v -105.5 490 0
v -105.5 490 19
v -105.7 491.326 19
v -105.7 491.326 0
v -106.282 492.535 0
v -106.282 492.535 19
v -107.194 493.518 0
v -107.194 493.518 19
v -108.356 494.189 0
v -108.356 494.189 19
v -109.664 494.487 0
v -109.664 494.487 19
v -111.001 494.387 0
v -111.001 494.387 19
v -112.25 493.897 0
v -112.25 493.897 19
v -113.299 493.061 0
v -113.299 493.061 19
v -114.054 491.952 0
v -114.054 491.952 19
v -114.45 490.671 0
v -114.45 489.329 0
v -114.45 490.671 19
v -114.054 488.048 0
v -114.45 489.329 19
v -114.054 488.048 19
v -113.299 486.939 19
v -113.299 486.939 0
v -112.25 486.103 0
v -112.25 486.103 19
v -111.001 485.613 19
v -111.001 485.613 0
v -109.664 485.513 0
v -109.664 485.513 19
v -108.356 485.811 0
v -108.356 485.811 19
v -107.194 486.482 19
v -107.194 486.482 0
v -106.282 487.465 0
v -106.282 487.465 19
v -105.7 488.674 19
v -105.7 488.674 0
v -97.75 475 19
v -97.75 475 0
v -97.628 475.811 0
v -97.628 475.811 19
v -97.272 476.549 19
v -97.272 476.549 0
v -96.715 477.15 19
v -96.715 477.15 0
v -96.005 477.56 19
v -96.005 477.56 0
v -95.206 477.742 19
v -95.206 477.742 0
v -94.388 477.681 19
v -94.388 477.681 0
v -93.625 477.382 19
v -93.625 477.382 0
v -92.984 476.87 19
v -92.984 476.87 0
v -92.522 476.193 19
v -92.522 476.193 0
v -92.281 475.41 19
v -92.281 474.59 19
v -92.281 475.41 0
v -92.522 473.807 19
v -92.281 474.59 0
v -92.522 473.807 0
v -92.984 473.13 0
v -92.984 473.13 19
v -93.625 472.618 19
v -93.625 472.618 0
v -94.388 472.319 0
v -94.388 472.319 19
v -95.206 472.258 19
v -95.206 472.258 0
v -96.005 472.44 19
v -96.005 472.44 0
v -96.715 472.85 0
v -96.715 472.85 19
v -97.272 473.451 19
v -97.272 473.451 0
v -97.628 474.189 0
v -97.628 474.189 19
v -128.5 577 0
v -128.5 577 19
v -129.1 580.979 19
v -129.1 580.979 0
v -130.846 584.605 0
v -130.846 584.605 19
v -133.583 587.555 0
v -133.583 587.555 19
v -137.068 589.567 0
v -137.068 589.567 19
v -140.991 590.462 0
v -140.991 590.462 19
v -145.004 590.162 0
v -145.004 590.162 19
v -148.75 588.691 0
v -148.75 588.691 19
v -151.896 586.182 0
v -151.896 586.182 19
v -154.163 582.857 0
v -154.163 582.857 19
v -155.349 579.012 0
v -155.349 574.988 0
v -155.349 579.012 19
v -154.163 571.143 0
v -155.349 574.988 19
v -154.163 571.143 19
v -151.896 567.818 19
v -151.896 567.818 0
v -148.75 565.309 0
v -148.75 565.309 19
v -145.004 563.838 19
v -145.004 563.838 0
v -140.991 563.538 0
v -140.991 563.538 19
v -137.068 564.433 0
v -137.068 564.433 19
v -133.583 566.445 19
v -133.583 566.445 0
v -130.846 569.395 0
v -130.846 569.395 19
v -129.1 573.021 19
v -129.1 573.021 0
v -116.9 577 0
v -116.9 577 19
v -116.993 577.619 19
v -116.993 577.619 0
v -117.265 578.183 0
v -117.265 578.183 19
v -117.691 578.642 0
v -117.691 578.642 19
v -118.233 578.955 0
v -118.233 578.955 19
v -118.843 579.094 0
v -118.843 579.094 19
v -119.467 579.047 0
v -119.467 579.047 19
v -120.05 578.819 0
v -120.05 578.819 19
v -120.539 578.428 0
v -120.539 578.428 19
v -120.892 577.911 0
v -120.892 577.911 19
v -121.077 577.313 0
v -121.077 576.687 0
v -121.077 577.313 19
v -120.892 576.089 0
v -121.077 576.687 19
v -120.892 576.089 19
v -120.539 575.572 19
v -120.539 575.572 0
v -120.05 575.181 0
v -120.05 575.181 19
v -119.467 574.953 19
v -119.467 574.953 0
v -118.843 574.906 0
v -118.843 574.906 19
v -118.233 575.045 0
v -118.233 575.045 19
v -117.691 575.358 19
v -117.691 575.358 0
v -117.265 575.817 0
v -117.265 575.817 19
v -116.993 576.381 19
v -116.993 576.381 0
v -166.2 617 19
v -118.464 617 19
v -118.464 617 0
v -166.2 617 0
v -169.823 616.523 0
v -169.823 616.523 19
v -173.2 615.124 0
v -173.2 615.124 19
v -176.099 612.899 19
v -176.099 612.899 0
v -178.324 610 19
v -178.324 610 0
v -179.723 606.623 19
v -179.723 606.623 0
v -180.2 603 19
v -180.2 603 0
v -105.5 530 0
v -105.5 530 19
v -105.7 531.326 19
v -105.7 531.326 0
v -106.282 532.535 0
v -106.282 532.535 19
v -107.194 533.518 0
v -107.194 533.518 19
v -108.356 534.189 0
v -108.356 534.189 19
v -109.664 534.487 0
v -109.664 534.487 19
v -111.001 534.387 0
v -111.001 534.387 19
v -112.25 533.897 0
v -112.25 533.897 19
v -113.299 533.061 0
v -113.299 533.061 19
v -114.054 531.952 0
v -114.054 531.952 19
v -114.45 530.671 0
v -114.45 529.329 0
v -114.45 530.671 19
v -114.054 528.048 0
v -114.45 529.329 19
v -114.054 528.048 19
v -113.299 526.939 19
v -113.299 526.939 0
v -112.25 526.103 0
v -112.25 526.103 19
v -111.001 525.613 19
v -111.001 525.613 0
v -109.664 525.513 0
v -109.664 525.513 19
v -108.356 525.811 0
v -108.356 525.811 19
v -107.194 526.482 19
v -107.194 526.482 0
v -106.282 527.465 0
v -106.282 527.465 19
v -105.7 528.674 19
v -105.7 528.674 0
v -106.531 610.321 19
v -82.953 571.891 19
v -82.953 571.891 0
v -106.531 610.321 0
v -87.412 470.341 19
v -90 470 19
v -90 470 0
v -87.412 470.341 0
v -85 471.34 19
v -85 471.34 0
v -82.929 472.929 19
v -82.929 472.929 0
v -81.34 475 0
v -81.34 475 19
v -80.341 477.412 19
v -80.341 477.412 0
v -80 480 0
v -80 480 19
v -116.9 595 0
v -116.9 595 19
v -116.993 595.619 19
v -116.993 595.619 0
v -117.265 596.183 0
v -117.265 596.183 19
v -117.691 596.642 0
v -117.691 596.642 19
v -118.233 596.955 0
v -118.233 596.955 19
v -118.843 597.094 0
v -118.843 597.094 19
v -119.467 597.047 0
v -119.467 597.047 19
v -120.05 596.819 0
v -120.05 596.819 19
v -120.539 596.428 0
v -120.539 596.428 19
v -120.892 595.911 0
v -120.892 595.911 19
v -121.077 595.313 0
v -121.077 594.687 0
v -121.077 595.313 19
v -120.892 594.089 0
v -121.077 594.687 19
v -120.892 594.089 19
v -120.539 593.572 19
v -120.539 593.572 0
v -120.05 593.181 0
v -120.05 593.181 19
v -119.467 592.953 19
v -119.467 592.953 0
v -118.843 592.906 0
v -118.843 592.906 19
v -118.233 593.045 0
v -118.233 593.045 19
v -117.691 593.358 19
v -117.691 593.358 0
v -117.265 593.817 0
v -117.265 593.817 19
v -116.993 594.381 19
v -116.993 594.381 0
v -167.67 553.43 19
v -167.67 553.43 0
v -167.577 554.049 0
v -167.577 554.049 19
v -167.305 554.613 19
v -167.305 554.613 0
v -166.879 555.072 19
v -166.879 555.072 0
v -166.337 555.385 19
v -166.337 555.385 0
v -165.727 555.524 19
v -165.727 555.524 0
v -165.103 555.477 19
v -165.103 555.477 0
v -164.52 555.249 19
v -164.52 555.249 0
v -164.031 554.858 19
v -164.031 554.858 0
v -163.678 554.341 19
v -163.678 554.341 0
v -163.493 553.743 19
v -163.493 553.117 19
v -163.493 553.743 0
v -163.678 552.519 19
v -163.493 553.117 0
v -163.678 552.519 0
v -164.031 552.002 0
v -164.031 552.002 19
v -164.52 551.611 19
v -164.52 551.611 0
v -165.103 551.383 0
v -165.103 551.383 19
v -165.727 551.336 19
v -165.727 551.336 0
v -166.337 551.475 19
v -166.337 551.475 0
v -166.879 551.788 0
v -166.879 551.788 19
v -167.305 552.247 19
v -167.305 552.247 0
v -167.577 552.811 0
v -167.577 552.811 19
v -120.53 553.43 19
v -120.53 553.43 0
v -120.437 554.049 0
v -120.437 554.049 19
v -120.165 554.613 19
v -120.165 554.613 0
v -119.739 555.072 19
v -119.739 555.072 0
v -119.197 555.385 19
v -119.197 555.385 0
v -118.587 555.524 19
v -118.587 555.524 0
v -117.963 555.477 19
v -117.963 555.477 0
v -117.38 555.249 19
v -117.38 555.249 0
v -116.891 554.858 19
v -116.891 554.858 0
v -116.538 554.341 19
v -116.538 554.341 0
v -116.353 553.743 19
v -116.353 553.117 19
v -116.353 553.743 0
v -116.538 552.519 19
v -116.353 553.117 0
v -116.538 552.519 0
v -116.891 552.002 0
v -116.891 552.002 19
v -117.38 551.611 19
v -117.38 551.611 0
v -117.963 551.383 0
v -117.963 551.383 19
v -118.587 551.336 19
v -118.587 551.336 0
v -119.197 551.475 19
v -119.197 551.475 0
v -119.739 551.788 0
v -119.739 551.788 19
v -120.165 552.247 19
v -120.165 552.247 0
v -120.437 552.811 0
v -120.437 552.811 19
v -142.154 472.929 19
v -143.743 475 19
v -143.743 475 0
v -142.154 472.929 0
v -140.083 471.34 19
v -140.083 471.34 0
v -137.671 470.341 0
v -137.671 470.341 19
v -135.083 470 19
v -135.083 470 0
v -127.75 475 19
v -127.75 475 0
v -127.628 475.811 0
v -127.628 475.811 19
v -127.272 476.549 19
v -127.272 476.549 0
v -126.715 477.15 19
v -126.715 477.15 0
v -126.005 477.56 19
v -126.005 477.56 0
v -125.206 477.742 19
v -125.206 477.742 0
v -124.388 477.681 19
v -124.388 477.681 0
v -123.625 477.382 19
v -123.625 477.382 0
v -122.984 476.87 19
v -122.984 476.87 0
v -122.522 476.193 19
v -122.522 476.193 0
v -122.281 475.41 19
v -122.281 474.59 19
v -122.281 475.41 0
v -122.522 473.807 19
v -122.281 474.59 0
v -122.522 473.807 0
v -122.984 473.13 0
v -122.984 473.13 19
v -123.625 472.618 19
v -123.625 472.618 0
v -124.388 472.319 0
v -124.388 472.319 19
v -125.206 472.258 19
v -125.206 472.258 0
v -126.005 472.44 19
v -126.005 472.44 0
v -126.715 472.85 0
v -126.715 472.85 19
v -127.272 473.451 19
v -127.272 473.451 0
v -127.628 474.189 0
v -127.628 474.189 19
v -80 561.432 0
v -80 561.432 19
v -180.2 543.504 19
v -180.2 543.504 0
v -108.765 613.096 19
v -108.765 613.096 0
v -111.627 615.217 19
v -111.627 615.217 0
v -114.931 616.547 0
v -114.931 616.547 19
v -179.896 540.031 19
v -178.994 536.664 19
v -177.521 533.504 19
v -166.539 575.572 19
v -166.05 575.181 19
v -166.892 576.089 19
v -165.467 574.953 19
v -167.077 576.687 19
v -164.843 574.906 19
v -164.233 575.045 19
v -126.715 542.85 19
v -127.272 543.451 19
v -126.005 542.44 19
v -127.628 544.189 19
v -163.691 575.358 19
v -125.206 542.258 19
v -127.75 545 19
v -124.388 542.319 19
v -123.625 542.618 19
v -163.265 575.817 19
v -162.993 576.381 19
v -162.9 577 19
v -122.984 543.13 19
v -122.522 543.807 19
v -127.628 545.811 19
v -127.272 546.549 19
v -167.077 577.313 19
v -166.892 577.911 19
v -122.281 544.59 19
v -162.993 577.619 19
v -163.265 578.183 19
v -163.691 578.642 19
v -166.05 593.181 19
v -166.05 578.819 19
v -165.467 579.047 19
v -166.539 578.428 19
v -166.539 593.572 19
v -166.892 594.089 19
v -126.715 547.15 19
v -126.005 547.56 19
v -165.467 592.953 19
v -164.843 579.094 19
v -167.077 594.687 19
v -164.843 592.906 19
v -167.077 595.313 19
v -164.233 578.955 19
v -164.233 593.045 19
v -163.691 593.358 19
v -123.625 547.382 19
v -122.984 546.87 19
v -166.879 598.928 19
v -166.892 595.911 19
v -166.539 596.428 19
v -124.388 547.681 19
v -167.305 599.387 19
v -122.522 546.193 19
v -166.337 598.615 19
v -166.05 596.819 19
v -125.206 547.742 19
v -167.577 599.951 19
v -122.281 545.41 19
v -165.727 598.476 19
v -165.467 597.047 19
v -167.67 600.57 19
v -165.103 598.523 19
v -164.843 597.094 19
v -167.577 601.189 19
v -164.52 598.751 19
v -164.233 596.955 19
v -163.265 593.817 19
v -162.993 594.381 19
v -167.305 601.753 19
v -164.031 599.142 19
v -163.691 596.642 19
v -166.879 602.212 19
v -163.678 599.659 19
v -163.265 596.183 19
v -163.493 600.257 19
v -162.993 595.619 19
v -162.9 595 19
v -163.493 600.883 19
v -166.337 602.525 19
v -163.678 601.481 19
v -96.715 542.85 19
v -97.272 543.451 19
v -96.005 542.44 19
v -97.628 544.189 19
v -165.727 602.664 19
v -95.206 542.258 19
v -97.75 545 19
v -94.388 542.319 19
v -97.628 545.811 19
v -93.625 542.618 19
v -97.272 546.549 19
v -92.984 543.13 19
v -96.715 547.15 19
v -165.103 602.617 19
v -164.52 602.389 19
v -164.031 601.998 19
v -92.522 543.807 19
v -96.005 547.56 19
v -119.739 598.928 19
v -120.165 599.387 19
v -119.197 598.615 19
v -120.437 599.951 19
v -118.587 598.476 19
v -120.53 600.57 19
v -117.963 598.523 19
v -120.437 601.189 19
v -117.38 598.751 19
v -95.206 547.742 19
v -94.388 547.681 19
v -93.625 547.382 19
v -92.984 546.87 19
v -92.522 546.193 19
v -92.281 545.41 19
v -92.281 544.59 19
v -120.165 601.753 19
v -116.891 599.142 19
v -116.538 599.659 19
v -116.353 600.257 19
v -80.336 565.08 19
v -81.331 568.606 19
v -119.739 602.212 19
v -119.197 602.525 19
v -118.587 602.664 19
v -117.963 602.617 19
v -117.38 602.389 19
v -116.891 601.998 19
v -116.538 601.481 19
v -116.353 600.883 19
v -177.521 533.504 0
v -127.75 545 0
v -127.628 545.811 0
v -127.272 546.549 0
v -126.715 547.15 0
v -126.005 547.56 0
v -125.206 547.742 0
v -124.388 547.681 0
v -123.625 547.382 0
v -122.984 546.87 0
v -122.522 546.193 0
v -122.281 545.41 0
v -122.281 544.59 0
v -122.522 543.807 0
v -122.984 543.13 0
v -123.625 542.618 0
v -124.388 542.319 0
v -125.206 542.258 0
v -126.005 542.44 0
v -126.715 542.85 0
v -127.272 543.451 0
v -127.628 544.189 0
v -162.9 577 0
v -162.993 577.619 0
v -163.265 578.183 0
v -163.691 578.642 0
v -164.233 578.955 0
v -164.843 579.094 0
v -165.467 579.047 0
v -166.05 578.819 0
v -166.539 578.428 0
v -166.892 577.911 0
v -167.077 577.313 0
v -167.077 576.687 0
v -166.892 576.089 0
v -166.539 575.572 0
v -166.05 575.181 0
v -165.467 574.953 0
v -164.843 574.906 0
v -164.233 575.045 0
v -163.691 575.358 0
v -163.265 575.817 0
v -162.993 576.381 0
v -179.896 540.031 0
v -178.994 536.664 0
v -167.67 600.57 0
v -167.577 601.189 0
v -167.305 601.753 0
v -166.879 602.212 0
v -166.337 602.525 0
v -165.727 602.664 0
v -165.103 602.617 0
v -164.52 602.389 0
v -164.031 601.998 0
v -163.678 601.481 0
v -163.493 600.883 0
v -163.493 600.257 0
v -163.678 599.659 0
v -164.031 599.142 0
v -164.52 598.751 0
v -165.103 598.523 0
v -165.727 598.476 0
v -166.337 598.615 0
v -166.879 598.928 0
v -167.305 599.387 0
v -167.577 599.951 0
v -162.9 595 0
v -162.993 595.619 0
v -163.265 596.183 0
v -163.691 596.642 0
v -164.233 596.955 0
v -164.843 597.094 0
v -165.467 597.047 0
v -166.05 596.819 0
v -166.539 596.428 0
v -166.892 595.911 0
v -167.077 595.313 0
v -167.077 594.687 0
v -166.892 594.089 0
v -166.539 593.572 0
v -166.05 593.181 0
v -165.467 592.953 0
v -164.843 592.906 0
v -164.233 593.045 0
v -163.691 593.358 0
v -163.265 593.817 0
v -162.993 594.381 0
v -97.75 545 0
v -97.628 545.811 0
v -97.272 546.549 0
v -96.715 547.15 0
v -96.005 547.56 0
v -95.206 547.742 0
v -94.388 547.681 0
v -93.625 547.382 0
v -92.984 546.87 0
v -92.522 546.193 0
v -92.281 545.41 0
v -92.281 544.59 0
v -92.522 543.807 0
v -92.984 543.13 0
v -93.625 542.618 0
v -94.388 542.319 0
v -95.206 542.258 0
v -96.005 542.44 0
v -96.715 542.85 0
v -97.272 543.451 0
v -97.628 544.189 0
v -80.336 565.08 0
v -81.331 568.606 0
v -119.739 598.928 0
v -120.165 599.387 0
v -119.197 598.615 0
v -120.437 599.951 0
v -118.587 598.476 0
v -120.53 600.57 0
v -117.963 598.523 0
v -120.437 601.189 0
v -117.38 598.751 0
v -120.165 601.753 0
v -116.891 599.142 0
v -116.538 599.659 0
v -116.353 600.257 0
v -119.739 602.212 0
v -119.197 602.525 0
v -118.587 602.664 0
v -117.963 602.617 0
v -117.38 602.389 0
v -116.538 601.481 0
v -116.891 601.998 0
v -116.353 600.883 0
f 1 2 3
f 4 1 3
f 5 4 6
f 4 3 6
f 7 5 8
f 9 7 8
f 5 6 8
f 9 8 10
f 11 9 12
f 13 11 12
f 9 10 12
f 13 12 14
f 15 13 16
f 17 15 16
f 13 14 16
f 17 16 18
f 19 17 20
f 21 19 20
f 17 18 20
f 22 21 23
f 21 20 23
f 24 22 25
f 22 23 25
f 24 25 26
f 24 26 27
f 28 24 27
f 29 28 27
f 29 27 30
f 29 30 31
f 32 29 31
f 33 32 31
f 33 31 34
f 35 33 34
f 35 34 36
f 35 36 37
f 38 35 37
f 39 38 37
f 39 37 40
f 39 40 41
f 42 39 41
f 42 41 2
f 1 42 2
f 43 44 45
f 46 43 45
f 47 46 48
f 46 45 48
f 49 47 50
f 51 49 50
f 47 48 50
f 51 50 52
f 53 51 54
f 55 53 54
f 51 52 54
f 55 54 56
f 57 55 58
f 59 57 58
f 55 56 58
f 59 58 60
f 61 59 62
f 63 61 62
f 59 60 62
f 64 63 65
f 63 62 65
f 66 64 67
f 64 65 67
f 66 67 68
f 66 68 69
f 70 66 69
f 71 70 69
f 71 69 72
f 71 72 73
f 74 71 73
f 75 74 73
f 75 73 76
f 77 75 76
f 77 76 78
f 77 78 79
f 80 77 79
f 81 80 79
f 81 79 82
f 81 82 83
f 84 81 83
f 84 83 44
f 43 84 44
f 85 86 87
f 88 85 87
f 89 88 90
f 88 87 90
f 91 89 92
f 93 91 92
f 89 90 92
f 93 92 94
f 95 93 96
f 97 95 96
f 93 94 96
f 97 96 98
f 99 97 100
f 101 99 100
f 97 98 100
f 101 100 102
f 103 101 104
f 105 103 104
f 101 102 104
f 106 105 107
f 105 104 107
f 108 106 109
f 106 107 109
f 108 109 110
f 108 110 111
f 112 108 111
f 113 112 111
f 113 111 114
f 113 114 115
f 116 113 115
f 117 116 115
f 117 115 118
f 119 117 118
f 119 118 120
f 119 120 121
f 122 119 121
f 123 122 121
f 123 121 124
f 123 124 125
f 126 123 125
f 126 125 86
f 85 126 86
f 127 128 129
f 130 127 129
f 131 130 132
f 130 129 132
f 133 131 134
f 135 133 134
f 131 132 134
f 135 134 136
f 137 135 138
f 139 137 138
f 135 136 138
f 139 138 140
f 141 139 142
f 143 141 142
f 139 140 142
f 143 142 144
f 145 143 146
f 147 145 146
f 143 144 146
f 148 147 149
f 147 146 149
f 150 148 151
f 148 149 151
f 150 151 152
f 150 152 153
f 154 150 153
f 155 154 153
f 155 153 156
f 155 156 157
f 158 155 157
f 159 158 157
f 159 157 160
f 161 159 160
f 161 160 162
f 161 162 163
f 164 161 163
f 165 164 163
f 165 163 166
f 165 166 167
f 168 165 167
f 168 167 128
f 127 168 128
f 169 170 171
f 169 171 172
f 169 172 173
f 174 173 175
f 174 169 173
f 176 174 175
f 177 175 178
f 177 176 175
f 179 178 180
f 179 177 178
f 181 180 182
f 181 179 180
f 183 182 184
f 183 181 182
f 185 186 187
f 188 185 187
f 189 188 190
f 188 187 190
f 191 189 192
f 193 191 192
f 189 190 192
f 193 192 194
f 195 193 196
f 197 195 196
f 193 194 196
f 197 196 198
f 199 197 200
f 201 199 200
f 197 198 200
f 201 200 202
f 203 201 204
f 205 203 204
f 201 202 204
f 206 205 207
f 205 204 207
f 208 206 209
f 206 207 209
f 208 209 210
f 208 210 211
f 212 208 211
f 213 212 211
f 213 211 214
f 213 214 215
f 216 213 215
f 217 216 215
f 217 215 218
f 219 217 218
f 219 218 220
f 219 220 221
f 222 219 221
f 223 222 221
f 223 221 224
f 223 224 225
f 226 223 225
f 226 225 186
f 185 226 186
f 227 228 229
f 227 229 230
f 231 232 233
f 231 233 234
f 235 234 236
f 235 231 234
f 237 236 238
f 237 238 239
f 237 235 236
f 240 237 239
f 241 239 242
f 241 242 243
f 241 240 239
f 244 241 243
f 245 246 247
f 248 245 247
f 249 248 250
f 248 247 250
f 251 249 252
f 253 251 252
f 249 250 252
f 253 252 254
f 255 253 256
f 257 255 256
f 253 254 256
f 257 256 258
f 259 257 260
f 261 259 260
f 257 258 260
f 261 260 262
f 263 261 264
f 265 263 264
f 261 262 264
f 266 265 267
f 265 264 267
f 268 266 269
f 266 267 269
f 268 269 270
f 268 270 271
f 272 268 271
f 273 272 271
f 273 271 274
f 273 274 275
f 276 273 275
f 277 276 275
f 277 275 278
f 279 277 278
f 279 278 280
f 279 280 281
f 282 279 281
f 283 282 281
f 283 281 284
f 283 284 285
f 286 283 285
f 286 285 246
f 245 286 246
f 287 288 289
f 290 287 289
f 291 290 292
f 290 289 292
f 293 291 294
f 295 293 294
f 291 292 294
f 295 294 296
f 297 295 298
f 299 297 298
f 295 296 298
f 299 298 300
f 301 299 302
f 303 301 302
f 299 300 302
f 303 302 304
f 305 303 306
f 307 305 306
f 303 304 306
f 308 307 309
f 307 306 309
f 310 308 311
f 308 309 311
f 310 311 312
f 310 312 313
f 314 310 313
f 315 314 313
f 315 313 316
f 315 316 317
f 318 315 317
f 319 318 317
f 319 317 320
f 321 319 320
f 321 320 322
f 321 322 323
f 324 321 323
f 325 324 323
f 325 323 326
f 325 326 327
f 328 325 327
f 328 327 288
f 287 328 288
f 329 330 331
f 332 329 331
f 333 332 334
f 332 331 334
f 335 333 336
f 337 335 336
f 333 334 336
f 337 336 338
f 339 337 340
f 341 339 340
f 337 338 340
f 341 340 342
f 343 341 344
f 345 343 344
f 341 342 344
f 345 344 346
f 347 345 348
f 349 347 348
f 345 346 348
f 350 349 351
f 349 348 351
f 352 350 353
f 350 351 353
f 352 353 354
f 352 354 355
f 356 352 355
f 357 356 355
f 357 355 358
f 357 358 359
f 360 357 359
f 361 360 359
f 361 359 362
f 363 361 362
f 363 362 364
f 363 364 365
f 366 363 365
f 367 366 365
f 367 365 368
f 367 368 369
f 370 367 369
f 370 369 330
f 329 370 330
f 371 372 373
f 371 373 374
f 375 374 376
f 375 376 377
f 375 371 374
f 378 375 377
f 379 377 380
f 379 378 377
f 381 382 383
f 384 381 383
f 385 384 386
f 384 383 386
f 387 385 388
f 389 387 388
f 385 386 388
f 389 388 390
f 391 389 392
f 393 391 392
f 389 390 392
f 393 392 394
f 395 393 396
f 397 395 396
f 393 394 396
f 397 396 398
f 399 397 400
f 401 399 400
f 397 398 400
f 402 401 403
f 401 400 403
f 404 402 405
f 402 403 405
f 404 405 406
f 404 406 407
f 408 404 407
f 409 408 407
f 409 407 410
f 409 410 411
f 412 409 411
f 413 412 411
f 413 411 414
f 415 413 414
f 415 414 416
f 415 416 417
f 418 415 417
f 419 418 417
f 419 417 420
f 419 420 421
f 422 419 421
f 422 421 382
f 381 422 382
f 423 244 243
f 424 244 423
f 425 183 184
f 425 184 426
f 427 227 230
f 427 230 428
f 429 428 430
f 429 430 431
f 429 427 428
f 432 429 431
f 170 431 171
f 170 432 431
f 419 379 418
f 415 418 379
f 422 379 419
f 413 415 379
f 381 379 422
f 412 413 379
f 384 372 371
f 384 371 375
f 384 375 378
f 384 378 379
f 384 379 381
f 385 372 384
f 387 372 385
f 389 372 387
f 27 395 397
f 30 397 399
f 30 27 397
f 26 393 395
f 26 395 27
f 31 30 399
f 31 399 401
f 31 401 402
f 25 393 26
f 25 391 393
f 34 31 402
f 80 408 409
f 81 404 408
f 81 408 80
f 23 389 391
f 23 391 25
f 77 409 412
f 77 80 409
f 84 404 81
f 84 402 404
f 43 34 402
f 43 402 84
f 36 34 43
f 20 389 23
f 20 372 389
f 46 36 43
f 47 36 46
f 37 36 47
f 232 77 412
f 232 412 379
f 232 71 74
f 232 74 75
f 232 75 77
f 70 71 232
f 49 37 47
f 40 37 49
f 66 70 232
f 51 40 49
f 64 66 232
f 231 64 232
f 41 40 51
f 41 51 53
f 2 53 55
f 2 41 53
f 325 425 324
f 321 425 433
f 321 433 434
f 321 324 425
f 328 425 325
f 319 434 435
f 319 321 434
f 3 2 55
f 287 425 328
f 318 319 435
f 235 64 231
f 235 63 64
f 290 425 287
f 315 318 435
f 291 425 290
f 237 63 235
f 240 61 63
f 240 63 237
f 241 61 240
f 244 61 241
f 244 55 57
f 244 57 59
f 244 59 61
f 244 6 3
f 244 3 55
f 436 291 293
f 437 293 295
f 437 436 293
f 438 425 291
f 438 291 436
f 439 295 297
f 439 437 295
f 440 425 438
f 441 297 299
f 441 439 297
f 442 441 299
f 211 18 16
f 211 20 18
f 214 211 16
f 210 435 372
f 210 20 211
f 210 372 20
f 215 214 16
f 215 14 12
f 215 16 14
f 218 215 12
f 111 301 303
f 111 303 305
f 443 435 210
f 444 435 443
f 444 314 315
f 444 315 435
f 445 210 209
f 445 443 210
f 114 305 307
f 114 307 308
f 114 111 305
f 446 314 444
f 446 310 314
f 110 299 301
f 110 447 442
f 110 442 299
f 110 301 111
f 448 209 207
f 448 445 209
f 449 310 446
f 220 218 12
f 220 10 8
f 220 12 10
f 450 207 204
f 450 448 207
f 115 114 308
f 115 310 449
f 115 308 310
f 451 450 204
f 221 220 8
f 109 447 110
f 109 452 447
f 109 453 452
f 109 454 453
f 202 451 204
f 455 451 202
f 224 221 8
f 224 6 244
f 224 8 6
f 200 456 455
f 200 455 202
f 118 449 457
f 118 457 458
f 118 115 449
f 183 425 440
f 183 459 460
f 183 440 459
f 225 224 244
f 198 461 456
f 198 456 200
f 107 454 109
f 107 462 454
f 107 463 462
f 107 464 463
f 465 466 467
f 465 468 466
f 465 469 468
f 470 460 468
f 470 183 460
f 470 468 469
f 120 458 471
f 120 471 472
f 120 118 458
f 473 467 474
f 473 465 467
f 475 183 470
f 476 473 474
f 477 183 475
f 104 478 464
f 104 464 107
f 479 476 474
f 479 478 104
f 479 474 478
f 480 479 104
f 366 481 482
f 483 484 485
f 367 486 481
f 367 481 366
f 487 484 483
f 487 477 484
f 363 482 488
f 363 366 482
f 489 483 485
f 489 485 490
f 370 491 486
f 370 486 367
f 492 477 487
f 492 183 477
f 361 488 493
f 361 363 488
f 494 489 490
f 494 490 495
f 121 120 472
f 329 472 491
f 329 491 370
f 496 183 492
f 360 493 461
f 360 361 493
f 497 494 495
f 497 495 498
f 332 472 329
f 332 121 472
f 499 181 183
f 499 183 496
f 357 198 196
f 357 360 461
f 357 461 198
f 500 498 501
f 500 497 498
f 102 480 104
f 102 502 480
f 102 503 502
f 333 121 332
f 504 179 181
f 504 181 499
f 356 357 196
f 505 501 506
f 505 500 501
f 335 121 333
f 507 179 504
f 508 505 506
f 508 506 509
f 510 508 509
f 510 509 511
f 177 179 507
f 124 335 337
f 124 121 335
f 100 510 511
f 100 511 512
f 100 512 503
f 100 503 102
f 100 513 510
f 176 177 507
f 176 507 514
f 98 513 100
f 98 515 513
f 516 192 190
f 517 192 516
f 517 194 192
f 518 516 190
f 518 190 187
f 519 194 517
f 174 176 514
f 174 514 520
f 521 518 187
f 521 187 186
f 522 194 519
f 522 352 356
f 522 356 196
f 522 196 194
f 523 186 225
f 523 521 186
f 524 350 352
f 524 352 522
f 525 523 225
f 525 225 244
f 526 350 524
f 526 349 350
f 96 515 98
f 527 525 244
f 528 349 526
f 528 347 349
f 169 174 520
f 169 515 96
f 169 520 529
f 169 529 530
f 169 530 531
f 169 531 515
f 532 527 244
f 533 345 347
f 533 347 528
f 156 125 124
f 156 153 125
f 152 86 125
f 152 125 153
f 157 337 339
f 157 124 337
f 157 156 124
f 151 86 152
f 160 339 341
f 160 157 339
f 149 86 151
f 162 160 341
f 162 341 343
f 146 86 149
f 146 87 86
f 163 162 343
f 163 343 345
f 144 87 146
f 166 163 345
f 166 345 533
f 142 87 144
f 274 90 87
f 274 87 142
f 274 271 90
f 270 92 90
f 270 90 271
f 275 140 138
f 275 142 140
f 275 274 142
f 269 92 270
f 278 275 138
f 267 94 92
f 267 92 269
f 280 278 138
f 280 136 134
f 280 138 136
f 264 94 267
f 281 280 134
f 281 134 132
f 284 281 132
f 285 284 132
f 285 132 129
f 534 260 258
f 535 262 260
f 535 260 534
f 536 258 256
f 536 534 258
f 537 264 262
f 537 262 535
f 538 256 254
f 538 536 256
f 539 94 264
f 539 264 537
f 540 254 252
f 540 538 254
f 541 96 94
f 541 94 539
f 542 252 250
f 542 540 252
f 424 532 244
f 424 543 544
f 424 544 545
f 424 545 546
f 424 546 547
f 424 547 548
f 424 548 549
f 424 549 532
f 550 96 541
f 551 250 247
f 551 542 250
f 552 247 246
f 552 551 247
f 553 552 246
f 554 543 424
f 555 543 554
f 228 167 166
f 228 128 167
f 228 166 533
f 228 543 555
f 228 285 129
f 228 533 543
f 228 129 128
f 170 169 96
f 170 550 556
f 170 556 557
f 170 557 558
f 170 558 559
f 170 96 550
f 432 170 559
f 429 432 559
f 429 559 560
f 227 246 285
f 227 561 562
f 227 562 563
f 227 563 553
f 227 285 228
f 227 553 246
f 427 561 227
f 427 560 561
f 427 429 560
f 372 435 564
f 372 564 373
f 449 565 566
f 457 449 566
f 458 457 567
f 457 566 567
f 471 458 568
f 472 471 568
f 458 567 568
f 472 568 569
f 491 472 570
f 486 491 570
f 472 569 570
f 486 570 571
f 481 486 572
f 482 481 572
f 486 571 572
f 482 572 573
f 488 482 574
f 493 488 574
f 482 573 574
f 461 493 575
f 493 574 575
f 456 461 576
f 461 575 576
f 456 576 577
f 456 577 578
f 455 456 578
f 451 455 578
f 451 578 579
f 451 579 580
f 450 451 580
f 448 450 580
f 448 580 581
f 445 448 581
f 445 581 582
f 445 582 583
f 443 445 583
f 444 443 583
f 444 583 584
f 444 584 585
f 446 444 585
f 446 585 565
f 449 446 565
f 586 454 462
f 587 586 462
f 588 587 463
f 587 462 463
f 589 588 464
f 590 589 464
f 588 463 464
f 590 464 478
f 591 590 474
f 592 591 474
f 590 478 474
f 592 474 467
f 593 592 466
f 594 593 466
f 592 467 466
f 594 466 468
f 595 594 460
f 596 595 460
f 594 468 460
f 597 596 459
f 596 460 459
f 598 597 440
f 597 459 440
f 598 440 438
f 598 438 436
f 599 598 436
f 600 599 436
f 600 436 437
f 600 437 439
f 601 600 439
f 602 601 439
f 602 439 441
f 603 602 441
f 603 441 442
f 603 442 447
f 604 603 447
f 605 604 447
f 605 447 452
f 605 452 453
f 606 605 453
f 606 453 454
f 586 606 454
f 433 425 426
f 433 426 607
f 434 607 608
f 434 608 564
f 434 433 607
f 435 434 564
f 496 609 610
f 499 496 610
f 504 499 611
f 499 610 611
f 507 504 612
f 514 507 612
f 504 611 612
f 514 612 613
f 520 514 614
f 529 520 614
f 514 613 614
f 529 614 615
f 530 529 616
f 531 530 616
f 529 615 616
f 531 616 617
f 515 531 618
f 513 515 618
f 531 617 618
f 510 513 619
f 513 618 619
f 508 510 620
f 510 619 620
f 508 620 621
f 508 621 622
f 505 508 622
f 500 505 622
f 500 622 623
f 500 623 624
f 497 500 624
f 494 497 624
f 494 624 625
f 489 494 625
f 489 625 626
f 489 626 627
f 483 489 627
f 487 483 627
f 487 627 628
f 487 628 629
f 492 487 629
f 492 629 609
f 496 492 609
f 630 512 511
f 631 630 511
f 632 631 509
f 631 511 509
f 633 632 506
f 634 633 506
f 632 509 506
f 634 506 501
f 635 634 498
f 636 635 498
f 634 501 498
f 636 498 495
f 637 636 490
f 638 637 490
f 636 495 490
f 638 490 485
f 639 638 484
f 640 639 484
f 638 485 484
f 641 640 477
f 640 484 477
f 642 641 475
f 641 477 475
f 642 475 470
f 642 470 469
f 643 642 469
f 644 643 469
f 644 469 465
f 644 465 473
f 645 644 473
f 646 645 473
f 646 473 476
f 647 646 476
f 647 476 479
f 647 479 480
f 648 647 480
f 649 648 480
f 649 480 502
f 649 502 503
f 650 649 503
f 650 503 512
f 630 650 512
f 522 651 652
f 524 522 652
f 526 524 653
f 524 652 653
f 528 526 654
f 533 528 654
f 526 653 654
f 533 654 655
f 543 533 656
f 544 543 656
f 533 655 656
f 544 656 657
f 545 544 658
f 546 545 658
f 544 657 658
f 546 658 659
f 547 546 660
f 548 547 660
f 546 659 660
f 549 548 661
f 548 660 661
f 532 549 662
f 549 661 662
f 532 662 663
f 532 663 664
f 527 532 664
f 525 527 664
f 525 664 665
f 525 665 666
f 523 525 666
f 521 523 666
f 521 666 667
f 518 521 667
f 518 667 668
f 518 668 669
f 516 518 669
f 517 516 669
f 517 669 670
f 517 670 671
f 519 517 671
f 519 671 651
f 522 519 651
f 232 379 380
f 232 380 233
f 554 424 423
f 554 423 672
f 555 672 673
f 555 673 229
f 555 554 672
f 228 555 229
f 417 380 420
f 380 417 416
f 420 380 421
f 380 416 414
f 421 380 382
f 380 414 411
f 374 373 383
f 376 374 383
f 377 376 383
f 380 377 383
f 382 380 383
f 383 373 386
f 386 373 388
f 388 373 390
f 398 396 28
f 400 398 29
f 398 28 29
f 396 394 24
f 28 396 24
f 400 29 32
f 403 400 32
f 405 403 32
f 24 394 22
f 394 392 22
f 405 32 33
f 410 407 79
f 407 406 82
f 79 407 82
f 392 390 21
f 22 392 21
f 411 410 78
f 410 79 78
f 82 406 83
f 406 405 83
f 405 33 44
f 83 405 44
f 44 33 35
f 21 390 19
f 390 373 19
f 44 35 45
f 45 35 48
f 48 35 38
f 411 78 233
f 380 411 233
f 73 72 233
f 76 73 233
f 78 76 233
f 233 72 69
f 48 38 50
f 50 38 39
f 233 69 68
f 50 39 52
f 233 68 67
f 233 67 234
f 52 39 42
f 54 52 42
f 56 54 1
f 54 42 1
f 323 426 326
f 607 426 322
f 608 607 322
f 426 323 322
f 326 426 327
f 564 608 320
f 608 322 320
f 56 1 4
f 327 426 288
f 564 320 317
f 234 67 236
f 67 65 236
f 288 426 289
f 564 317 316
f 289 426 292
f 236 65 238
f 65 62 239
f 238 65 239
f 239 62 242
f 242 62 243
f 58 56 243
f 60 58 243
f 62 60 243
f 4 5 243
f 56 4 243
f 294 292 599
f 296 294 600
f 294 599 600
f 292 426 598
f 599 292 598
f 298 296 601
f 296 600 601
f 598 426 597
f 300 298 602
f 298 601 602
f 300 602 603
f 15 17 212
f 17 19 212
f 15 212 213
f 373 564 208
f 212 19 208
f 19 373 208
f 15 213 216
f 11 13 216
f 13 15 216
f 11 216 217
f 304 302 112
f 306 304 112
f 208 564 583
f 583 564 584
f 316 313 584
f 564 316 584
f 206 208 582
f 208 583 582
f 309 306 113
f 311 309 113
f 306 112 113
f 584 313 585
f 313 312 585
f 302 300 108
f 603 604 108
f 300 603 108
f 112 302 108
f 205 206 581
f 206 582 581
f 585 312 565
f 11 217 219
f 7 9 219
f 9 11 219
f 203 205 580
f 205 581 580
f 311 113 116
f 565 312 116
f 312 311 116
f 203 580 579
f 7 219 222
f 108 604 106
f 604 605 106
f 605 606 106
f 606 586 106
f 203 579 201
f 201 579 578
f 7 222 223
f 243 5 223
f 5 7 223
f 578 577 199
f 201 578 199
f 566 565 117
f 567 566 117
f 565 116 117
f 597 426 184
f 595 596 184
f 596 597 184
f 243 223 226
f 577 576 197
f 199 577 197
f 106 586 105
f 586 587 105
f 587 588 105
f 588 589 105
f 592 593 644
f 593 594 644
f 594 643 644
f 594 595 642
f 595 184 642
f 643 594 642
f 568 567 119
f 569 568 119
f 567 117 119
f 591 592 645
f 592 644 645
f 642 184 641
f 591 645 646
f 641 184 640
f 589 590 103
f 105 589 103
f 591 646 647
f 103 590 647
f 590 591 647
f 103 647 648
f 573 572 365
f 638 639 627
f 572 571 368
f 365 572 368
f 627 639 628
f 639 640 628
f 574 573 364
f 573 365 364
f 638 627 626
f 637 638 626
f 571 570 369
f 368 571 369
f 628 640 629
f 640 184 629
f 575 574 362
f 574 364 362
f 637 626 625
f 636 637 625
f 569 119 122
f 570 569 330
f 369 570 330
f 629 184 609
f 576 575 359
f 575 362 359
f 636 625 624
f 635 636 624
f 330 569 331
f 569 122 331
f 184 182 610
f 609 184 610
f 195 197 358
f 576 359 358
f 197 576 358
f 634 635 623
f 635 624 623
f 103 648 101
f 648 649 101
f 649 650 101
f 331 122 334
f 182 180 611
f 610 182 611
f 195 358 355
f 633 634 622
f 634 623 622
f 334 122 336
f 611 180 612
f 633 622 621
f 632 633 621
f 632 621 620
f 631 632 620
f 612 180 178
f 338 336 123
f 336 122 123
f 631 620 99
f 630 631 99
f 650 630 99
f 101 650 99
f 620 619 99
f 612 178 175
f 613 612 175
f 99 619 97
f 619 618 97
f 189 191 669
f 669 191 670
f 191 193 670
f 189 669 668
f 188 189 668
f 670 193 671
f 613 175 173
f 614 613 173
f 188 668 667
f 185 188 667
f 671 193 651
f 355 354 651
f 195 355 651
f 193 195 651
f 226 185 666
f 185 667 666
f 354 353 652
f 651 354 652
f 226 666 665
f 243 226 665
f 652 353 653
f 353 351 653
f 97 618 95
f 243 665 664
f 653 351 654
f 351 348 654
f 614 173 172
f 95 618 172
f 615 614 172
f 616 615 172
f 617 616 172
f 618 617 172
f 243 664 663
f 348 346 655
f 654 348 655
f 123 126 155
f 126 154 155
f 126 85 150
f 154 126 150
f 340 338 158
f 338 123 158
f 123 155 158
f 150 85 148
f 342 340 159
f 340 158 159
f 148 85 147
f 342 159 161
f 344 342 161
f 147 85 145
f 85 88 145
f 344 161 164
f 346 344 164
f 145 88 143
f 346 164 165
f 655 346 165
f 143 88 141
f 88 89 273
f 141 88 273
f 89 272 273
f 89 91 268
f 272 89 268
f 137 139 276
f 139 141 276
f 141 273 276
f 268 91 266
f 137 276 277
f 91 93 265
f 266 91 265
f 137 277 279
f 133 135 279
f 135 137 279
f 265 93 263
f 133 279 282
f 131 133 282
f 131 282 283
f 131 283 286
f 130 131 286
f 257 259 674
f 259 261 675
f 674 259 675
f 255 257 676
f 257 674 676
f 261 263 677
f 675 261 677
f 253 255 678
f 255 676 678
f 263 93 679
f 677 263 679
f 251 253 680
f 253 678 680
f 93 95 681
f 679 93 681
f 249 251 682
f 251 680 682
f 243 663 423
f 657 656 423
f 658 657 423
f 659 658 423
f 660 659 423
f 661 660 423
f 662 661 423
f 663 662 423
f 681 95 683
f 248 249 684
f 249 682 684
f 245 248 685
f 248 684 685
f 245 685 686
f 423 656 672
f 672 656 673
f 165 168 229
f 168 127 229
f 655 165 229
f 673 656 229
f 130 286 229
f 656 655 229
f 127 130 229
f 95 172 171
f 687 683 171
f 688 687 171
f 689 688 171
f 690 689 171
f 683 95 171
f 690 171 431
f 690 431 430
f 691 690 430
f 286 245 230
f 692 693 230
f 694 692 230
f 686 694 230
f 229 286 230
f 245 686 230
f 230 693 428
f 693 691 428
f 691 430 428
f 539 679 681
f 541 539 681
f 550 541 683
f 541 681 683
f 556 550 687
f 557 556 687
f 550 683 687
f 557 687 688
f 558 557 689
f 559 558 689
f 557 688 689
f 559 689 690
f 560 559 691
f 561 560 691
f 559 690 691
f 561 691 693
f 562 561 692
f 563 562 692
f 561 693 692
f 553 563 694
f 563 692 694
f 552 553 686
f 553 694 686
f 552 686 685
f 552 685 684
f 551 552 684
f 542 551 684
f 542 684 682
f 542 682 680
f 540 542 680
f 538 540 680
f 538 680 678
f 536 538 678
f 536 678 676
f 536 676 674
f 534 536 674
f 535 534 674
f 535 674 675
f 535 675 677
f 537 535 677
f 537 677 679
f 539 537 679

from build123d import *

# Parameters (mm, degrees)
BOSS_EXTRUDE1_DEPTH     = 19
FILLET1_R               = 10
SKETCH2_R               = 13.5
CUT_EXTRUDE1_DEPTH      = 20
TAP_DRILL_FOR_M5_TAP1_D = 4.2
M5_CLEARANCE_HOLE1_D    = 5.5
TAP_DRILL_FOR_M5_TAP2_D = 4.2
FILLET2_R               = 4
BOSS_EXTRUDE2_DEPTH     = 19
M8_CLEARANCE_HOLE1_D    = 9


with BuildPart() as part:
    # Sketch1 → Boss-Extrude1 (new body)
    with BuildSketch(Plane.XY):
        with BuildLine():
            Line((-170.200000001, 540.824594888), (-129.309401077, 470))
            Line((-129.309401077, 470), (-93, 470))
            ThreePointArc((-93, 470), (-90.878679656, 470.878679656), (-90, 473))
            Line((-90, 473), (-90, 564.25527297))
            Line((-90, 564.25527297), (-116.225329238, 607))
            Line((-116.225329238, 607), (-170.200000001, 607))
            Line((-170.200000001, 607), (-170.200000001, 540.824594888))
        make_face()
    extrude(amount=BOSS_EXTRUDE1_DEPTH)

    # Fillet1
    fillet1_edges = [part.edges().sort_by_distance(p)[0] for p in [
        (-90, 564.25527297, 9.5),
        (-129.309401077, 470, 9.5),
        (-170.200000001, 540.824594888, 9.5),
    ]]
    fillet(fillet1_edges, radius=FILLET1_R)

    # Sketch2 → Cut-Extrude1 (cut)
    with BuildSketch(Plane.XY.offset(19)):
        with Locations((-142.000000001, 577)):
            Circle(SKETCH2_R)
    extrude(amount=-CUT_EXTRUDE1_DEPTH, mode=Mode.SUBTRACT)

    # Tap Drill for M5 Tap1 (through all)
    with Locations(Plane(origin=(0, 0, 0), x_dir=(-1, 0, 0), z_dir=(0, 0, -1))):
        with Locations((119.000000001, 595), (119.000000001, 577), (165.000000001, 577), (165.000000001, 595)):
            Hole(TAP_DRILL_FOR_M5_TAP1_D / 2)

    # M5 Clearance Hole1 (through all)
    with Locations(Plane.XY.offset(19)):
        with Locations((-95, 545), (-125, 545), (-125, 475), (-95, 475), (-110, 490), (-110, 530)):
            Hole(M5_CLEARANCE_HOLE1_D / 2)

    # Tap Drill for M5 Tap2 (through all)
    with Locations(Plane.XY.offset(19)):
        with Locations((-165.570000001, 553.43), (-165.570000001, 600.57), (-118.430000001, 553.43), (-118.430000001, 600.57)):
            Hole(TAP_DRILL_FOR_M5_TAP2_D / 2)

    # Fillet2
    fillet2_edges = [part.edges().sort_by_distance(p)[0] for p in [
        (-116.225329238, 607, 9.5),
        (-170.200000001, 607, 9.5),
    ]]
    fillet(fillet2_edges, radius=FILLET2_R)

    # Sketch11 → Boss-Extrude2 (add)
    with BuildSketch(Plane.XY.offset(19)):
        with BuildLine():
            ThreePointArc((-80, 561.432106106), (-80.75234172, 566.866041212), (-82.952765074, 571.89115871))
            Line((-82.952765074, 571.89115871), (-106.530973281, 610.321336823))
            ThreePointArc((-106.530973281, 610.321336823), (-111.626593598, 615.216765438), (-118.464037729, 617))
            Line((-118.464037729, 617), (-166.200000001, 617))
            ThreePointArc((-166.200000001, 617), (-176.099494937, 612.899494937), (-180.200000001, 603))
            Line((-180.200000001, 603), (-180.200000001, 543.504086813))
            ThreePointArc((-180.200000001, 543.504086813), (-179.518516526, 538.327705911), (-177.520508076, 533.504086813))
            Line((-177.520508076, 533.504086813), (-143.743157806, 475))
            ThreePointArc((-143.743157806, 475), (-140.082903769, 471.339745962), (-135.082903769, 470))
            Line((-135.082903769, 470), (-123.535898385, 470))
            ThreePointArc((-123.535898385, 470), (-128.535898385, 471.339745962), (-132.196152423, 475))
            Line((-132.196152423, 475), (-168.860254039, 538.504086813))
            ThreePointArc((-168.860254039, 538.504086813), (-169.859258264, 540.915896362), (-170.200000001, 543.504086813))
            Line((-170.200000001, 543.504086813), (-170.200000001, 603))
            ThreePointArc((-170.200000001, 603), (-169.028427125, 605.828427125), (-166.200000001, 607))
            Line((-166.200000001, 607), (-118.464037729, 607))
            ThreePointArc((-118.464037729, 607), (-116.510482263, 606.490504411), (-115.054590744, 605.091810521))
            Line((-115.054590744, 605.091810521), (-91.476382537, 566.661632408))
            ThreePointArc((-91.476382537, 566.661632408), (-90.37617086, 564.149073659), (-90, 561.432106106))
            Line((-90, 561.432106106), (-90, 473))
            ThreePointArc((-90, 473), (-90.878679656, 470.878679656), (-93, 470))
            Line((-93, 470), (-90, 470))
            ThreePointArc((-90, 470), (-82.928932188, 472.928932188), (-80, 480))
            Line((-80, 480), (-80, 561.432106106))
        make_face()
    extrude(amount=-BOSS_EXTRUDE2_DEPTH)

    # M8 Clearance Hole1 (through all)
    with Locations(Plane(origin=(-110, 490, 0), x_dir=(-1, 0, 0), z_dir=(0, 0, -1))):
        with Locations((0, 0), (0, 40)):
            Hole(M8_CLEARANCE_HOLE1_D / 2)


solid = part.part
